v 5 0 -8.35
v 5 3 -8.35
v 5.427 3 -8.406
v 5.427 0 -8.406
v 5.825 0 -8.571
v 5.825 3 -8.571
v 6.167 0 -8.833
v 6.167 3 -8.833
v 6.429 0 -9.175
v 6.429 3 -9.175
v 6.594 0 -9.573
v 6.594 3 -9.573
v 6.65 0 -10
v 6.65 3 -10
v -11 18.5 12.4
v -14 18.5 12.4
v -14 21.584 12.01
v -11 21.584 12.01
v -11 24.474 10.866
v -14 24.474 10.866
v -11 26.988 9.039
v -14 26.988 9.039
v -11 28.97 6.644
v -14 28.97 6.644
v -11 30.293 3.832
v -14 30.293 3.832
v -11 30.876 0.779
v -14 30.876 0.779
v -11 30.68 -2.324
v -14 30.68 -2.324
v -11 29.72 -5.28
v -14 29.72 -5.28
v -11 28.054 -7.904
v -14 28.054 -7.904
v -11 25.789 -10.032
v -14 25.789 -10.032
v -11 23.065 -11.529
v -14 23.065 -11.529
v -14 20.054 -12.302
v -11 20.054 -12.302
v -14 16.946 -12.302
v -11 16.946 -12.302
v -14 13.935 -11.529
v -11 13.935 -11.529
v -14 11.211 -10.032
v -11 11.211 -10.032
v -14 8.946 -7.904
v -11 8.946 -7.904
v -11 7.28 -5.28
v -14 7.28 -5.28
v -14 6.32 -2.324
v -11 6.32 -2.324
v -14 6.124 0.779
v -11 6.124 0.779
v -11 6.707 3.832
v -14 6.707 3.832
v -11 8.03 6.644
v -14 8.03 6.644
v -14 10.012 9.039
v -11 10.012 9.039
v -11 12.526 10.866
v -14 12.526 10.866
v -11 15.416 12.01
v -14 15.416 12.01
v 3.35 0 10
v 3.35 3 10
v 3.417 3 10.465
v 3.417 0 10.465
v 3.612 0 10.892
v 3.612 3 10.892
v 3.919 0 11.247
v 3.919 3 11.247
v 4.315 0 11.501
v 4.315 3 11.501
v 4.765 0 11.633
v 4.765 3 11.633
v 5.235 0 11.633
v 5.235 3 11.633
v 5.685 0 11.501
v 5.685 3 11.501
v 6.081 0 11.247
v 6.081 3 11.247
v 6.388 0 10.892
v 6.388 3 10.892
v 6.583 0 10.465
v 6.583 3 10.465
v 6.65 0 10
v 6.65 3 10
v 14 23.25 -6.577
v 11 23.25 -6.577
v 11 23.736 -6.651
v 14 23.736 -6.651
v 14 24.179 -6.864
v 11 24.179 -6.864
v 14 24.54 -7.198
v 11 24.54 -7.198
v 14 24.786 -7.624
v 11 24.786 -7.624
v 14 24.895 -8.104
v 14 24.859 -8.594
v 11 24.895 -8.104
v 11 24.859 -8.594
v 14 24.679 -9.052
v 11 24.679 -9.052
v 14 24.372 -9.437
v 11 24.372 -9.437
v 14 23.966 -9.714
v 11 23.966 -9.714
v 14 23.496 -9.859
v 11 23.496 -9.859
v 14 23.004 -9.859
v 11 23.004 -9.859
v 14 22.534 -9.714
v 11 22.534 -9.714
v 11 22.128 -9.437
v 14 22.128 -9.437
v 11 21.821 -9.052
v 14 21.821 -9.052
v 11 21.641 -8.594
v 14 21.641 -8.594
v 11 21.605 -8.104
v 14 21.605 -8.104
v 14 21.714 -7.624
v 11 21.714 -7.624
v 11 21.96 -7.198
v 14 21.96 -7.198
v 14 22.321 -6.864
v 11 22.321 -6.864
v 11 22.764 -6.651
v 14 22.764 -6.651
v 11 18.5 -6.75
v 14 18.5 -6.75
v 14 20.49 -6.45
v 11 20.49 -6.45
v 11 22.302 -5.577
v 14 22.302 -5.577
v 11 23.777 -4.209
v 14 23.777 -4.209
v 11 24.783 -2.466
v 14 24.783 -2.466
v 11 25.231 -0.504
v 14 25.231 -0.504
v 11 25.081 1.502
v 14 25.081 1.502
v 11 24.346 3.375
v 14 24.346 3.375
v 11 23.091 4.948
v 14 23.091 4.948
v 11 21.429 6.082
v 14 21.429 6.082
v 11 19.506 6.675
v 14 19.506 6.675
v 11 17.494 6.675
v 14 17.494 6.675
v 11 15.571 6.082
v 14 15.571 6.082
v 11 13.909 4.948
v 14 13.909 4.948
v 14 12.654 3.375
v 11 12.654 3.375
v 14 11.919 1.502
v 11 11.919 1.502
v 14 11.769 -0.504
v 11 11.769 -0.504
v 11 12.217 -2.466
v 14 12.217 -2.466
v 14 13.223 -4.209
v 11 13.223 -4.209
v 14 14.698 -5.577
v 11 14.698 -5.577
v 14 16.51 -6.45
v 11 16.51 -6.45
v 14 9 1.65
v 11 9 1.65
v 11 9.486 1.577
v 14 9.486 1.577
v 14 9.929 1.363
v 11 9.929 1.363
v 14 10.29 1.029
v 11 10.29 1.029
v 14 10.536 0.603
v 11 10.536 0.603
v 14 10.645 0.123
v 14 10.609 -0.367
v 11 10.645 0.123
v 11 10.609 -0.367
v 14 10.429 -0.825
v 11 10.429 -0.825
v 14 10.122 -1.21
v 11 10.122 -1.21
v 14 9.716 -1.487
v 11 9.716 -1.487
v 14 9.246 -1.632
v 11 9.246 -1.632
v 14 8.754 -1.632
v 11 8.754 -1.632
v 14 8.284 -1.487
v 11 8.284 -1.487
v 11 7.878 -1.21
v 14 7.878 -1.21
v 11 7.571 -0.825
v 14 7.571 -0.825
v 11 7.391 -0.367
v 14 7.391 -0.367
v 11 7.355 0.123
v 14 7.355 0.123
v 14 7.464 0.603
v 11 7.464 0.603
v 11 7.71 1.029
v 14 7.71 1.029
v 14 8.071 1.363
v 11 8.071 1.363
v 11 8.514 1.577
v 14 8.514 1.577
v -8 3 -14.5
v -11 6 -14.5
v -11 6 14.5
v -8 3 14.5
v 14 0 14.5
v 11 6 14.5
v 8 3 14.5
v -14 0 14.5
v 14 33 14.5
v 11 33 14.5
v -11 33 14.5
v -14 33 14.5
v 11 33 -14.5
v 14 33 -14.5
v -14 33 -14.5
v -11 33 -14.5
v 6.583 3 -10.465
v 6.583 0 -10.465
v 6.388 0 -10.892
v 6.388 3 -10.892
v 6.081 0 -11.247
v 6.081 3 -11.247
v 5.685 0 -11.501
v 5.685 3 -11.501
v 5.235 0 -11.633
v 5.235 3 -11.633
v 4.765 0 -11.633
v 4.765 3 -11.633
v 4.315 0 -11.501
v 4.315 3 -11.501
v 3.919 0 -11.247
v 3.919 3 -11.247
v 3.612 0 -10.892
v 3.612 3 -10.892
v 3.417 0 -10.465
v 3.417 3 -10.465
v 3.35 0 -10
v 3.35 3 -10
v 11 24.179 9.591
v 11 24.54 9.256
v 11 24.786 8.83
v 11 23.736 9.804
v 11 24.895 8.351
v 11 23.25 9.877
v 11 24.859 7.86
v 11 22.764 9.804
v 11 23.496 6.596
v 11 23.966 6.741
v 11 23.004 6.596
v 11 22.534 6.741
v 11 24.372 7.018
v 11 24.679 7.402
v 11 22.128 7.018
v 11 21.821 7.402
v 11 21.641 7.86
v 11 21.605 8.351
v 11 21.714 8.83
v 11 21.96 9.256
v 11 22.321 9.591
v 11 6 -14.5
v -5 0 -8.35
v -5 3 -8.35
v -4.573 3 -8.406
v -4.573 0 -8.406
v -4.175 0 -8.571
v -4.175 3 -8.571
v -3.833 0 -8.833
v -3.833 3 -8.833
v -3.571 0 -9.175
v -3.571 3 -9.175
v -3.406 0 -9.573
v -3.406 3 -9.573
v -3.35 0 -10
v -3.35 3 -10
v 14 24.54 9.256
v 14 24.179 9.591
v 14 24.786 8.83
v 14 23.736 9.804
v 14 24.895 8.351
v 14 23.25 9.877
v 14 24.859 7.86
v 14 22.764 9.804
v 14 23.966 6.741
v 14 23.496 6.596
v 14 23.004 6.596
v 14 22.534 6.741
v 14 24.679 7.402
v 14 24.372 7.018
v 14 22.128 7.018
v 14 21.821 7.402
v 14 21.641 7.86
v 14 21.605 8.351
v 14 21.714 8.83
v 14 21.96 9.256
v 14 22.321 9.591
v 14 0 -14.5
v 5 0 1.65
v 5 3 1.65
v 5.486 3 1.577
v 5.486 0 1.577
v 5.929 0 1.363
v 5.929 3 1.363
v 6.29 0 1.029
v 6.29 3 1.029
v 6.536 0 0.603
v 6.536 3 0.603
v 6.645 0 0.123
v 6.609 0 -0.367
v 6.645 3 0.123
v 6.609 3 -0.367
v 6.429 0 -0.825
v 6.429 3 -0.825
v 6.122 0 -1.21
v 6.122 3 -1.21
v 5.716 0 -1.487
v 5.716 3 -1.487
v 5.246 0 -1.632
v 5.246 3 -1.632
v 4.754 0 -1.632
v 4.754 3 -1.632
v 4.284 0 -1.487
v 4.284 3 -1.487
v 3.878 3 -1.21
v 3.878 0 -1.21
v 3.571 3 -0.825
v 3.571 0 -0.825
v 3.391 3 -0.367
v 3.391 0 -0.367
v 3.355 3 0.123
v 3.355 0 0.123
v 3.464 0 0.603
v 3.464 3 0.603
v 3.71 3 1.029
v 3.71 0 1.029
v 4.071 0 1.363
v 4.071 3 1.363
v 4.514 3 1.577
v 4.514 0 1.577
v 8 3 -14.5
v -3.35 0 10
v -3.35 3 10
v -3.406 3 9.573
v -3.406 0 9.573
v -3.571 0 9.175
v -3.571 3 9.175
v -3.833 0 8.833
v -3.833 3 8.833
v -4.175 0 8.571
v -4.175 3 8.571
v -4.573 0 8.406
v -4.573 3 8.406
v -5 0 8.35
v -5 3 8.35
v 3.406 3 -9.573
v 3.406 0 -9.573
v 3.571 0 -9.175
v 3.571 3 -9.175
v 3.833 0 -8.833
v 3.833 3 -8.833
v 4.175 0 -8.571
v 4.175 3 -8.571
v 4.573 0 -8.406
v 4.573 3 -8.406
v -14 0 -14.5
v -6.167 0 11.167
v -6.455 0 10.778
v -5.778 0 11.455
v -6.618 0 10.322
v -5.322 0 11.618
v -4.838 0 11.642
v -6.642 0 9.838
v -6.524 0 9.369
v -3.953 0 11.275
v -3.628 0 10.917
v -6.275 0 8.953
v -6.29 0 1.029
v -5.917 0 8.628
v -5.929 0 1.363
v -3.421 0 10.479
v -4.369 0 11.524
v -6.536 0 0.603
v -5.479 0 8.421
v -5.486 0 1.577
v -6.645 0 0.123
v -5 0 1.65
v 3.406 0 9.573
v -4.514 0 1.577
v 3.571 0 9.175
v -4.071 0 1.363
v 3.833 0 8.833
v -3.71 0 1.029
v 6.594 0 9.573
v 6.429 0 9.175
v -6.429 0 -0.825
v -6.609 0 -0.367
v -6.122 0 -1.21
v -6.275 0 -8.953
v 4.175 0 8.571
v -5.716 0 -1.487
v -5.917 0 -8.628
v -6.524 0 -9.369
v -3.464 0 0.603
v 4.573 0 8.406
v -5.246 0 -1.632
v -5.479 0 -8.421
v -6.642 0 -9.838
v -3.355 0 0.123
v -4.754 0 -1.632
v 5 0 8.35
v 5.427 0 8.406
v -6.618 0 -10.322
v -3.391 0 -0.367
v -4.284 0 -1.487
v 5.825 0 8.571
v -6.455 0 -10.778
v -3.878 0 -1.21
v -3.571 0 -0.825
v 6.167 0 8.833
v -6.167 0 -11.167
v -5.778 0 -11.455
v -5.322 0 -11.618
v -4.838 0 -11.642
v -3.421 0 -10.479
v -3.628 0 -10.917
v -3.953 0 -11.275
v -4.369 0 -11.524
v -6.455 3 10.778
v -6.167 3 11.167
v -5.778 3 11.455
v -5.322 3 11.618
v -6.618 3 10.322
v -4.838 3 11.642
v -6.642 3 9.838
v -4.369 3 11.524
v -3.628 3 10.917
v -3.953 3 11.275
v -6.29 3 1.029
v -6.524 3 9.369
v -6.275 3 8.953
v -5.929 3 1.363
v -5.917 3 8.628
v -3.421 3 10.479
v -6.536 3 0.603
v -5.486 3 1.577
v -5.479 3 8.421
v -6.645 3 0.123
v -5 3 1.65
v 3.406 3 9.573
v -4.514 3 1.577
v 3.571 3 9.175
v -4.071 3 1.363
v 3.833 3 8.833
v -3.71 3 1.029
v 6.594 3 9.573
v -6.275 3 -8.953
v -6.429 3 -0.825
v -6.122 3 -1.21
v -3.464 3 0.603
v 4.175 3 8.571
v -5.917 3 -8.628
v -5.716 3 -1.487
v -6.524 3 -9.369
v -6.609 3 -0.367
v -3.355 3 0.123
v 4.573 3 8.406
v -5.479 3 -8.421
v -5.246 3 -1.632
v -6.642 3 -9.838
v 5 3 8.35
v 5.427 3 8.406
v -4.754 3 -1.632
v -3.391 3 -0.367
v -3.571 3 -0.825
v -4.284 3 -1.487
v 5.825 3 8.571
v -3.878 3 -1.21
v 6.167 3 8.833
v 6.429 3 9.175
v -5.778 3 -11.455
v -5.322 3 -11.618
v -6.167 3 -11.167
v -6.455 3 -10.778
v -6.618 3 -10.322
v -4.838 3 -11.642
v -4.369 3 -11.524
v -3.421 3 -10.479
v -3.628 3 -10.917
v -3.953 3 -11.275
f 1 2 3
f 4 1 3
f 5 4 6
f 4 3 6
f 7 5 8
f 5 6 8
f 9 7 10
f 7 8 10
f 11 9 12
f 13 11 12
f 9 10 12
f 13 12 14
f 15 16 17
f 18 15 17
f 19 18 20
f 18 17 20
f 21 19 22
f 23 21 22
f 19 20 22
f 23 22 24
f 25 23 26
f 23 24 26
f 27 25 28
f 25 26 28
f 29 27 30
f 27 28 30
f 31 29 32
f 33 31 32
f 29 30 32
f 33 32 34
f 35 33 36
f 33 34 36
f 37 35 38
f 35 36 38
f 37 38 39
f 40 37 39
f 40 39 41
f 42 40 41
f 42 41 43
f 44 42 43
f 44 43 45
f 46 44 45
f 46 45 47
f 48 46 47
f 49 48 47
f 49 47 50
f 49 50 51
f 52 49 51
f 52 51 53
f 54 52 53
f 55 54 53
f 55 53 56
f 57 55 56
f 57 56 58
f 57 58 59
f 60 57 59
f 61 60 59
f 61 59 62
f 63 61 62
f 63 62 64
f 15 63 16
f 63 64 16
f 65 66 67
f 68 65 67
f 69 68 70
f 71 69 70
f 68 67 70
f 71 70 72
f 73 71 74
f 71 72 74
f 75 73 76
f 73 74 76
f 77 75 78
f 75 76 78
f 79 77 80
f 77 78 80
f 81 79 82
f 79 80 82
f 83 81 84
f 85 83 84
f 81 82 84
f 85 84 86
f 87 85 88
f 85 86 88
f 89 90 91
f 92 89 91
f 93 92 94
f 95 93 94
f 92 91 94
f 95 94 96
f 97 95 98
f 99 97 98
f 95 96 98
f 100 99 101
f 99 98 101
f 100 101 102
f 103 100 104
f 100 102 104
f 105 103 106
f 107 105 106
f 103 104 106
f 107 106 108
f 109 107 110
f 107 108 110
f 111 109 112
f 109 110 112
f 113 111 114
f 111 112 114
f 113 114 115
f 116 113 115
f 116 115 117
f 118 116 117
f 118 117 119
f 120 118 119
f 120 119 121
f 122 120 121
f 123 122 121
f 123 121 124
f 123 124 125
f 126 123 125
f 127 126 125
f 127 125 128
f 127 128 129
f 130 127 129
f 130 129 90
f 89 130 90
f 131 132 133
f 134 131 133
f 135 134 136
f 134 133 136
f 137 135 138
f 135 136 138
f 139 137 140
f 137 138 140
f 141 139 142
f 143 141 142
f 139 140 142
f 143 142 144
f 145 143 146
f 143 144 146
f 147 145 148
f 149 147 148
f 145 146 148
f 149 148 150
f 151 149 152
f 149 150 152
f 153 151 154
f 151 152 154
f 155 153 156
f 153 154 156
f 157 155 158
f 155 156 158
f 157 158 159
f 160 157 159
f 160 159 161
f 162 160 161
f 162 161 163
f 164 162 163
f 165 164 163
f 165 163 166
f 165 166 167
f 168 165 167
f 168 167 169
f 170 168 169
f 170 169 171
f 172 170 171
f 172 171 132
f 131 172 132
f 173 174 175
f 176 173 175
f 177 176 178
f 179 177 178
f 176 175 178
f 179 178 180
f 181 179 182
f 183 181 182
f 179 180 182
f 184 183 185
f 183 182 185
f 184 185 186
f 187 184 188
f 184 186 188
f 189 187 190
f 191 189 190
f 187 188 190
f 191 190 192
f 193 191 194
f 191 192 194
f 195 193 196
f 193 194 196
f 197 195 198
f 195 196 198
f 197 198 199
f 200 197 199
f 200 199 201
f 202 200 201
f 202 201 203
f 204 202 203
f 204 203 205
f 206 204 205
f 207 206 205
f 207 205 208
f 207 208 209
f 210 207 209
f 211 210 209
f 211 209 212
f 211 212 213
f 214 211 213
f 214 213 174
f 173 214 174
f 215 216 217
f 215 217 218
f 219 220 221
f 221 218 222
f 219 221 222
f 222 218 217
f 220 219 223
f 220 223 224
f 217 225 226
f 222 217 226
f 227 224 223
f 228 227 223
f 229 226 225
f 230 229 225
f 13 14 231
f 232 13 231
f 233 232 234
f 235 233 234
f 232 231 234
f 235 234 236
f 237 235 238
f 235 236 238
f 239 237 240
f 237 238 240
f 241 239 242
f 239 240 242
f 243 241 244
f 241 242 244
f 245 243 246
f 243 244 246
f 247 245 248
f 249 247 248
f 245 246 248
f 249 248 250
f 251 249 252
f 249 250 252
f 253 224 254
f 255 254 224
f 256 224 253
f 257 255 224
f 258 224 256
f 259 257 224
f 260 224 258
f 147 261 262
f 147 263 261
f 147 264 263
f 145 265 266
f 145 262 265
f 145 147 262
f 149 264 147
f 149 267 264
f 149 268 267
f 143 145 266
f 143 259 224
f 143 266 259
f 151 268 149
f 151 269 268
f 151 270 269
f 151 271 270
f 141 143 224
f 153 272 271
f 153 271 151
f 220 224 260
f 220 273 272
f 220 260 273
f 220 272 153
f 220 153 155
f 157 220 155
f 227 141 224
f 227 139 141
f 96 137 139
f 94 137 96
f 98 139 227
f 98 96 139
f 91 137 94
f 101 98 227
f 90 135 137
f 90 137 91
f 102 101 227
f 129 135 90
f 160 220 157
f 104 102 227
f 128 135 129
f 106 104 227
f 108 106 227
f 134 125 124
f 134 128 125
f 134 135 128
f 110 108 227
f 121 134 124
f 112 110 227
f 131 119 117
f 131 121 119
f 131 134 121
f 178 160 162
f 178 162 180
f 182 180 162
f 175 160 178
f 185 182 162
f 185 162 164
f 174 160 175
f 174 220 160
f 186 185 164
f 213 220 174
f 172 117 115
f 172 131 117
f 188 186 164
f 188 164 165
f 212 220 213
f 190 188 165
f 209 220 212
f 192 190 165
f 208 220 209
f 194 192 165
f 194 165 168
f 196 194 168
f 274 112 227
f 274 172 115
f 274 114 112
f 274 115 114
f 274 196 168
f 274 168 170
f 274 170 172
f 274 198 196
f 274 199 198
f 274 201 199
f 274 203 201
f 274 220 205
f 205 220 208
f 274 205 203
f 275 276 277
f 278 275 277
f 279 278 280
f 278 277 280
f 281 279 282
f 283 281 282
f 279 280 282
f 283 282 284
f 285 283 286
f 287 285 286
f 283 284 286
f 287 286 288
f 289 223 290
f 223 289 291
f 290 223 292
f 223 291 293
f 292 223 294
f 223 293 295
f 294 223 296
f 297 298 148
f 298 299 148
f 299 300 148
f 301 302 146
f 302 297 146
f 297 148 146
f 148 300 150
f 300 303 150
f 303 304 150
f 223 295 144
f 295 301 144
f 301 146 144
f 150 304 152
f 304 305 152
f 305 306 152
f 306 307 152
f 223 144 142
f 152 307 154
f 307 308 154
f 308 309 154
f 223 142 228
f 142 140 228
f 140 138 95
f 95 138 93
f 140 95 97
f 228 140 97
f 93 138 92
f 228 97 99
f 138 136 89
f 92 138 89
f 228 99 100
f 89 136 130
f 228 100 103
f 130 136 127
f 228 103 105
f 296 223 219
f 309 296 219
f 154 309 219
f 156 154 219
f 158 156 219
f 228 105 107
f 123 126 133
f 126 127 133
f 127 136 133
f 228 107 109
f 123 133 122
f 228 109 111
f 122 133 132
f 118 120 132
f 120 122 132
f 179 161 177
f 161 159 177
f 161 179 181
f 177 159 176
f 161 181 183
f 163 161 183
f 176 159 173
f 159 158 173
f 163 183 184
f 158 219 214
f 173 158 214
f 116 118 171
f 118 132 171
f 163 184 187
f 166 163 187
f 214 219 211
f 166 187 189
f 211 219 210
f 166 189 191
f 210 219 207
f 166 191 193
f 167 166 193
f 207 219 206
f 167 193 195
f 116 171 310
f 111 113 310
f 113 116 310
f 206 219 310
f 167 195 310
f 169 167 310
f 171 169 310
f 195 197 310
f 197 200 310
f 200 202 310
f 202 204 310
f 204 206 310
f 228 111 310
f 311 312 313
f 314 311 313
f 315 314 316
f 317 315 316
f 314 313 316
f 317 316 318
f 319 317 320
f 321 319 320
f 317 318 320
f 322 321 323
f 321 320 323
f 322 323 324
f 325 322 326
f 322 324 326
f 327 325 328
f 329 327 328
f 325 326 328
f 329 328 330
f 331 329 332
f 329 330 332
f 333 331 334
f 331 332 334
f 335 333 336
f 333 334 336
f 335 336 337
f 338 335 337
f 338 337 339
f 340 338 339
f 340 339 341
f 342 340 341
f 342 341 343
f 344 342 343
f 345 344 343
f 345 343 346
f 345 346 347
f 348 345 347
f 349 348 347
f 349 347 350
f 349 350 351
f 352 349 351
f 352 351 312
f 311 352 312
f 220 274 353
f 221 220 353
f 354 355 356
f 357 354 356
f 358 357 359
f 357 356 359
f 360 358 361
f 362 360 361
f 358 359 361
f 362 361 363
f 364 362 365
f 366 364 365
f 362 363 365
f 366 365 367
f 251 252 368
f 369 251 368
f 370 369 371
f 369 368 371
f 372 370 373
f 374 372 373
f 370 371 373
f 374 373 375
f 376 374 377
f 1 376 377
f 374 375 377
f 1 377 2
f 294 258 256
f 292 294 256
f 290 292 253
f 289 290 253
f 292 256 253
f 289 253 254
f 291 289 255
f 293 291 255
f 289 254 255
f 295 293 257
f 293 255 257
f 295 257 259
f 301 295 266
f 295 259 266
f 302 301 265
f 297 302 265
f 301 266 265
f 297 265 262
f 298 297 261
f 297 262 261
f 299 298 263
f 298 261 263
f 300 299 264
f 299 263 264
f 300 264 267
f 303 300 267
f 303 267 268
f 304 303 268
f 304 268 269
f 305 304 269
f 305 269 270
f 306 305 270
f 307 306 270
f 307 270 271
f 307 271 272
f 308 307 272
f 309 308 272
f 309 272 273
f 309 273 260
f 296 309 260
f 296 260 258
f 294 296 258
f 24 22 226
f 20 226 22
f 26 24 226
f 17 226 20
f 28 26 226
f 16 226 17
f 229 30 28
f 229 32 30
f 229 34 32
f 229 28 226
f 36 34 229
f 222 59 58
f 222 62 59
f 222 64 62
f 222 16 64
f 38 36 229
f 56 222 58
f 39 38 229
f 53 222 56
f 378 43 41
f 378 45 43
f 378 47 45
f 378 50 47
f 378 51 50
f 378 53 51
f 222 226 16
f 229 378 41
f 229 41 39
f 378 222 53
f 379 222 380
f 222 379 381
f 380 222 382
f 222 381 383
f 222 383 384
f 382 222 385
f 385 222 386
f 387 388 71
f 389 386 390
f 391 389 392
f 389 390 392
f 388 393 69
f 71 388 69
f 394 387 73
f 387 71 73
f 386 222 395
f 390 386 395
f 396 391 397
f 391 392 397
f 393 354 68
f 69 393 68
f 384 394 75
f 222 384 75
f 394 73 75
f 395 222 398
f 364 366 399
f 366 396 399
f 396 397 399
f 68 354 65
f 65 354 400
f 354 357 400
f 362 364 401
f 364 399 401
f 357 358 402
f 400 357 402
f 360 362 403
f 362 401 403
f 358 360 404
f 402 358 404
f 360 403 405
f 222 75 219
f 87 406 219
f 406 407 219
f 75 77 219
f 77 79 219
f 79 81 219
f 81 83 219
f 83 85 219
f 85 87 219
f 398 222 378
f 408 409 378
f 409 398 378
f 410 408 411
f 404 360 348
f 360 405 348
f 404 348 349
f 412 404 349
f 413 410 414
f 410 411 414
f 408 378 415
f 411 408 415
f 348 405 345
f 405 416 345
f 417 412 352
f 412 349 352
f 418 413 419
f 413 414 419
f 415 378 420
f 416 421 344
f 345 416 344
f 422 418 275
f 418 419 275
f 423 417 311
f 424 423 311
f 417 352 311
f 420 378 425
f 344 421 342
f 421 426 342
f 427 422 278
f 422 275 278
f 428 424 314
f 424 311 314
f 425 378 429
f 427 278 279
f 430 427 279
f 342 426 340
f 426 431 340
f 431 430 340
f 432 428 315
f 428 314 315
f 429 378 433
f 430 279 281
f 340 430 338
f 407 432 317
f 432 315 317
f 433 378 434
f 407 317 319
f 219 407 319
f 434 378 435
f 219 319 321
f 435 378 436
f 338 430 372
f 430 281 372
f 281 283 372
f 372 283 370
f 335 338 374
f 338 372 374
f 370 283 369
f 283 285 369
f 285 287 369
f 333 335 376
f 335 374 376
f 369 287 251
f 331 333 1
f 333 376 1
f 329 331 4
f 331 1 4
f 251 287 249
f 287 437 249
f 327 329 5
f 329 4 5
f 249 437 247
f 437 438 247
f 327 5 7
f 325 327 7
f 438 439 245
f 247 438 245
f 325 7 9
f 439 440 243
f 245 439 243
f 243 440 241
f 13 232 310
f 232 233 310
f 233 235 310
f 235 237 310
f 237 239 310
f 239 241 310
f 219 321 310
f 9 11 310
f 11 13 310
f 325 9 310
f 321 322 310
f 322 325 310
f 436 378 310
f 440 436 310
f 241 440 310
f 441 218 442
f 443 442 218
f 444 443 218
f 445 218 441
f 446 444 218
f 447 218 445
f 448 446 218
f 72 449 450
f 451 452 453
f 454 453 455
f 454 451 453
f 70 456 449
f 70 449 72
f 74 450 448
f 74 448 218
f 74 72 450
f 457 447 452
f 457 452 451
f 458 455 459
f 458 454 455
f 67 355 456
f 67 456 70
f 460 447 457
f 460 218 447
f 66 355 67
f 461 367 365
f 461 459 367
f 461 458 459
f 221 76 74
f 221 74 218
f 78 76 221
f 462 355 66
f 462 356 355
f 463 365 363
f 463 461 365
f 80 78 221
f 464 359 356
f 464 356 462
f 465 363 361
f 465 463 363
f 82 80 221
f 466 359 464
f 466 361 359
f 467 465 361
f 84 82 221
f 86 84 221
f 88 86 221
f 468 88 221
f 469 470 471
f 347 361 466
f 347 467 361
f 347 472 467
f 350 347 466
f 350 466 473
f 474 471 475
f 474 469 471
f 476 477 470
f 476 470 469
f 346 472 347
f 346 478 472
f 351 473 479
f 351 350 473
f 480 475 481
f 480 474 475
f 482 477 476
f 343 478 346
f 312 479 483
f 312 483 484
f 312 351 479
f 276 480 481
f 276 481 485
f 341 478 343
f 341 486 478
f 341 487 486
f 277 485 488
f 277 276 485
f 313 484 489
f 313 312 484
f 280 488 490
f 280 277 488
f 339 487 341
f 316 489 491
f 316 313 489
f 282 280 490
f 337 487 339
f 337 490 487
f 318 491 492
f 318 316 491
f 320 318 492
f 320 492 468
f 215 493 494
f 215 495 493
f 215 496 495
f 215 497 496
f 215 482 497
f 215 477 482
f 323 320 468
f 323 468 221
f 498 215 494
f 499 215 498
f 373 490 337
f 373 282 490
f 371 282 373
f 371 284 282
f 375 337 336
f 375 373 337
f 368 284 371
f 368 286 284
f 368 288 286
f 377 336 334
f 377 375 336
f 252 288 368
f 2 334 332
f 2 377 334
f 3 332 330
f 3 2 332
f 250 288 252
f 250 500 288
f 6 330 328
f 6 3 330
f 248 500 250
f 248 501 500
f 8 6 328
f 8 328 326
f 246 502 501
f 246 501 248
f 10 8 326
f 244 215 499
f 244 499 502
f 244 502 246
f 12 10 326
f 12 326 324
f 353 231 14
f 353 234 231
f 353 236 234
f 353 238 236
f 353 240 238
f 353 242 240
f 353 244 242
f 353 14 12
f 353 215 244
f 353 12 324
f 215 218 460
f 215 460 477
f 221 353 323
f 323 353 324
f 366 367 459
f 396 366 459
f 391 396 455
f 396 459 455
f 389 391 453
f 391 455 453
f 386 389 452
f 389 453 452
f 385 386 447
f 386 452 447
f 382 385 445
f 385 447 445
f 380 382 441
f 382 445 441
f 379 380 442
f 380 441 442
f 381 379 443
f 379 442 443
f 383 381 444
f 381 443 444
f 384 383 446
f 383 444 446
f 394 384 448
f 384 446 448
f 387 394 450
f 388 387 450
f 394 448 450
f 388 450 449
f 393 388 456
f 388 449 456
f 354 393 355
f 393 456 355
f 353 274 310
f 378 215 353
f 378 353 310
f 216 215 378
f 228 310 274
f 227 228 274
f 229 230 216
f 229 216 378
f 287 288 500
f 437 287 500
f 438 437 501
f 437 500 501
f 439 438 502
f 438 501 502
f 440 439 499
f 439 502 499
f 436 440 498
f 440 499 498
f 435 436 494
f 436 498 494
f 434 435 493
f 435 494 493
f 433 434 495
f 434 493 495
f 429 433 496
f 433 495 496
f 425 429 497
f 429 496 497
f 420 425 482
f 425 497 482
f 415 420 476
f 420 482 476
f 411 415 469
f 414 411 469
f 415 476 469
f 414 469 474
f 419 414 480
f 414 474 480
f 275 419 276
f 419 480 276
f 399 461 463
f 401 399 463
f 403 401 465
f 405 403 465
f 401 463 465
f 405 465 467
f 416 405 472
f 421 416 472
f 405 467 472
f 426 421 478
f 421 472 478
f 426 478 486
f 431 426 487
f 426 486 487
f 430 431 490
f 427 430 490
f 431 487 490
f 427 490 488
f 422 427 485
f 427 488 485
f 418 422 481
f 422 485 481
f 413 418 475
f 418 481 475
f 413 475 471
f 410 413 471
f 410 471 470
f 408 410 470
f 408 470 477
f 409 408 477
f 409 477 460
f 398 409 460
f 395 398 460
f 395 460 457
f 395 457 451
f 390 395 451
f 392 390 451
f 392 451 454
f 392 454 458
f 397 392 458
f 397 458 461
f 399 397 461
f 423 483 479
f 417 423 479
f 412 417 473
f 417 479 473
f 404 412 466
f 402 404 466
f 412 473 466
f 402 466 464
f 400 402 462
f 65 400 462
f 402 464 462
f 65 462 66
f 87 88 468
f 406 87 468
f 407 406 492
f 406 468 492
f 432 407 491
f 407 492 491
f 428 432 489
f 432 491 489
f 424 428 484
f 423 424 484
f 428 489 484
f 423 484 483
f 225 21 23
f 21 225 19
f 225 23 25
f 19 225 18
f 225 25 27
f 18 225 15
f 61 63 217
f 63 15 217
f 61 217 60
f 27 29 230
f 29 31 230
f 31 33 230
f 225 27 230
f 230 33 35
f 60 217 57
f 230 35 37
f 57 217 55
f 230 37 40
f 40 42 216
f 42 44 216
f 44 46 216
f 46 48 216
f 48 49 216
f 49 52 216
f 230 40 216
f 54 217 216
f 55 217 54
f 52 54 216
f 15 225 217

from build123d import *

# Parameters (mm, degrees)
SKETCH_1_W          = 28
SKETCH_1_H          = 29
EXTRUDE_1_DEPTH     = 3
SKETCH_2_W          = 3
SKETCH_2_H          = 29
EXTRUDE_2_DEPTH     = 30
SKETCH_3_R          = 1.65
CUT_EXTRUDE_1_DEPTH = 33
EXTRUDE_3_DEPTH     = 29
SKETCH_6_R          = 12.4
CUT_EXTRUDE_2_DEPTH = 5
SKETCH_8_R          = 1.65
CUT_EXTRUDE_3_DEPTH = 5
SKETCH_9_R          = 6.75
CUT_EXTRUDE_4_DEPTH = 5


with BuildPart() as part:
    # 草图1 → 凸台-拉伸1 (new body)
    with BuildSketch(Plane(origin=(0, 0, 0), x_dir=(1, 0, 0), z_dir=(0, 1, 0))):
        Rectangle(SKETCH_1_W, SKETCH_1_H)
    extrude(amount=EXTRUDE_1_DEPTH)

    # 草图2 → 凸台-拉伸2 (add)
    with BuildSketch(Plane(origin=(0, 3, 0), x_dir=(1, 0, 0), z_dir=(0, 1, 0))):
        with Locations((12.5, 0)):
            Rectangle(SKETCH_2_W, SKETCH_2_H)
        with Locations((-12.5, 0)):
            Rectangle(SKETCH_2_W, SKETCH_2_H)
    extrude(amount=EXTRUDE_2_DEPTH)

    # 草图3 → 切除-拉伸1 (cut)
    with BuildSketch(Plane.ZY.offset(14)):
        with Locations((-8.227241336, 23.25)):
            Circle(SKETCH_3_R)
        with Locations((8.227241336, 23.25)):
            Circle(SKETCH_3_R)
        with Locations((0, 9)):
            Circle(SKETCH_3_R)
    extrude(amount=-CUT_EXTRUDE_1_DEPTH, mode=Mode.SUBTRACT)

    # 草图5 → 凸台-拉伸3 (add)
    with BuildSketch(Plane(origin=(0, 0, -14.5), x_dir=(-1, 0, 0), z_dir=(0, 0, -1))):
        Polygon((11, 3), (11, 6), (8, 3), align=None)
        Polygon((-11, 3), (-11, 6), (-8, 3), align=None)
    extrude(amount=-EXTRUDE_3_DEPTH)

    # 草图6 → 切除-拉伸2 (cut)
    with BuildSketch(Plane.ZY.offset(14)):
        with Locations((0, 18.5)):
            Circle(SKETCH_6_R)
    extrude(amount=-CUT_EXTRUDE_2_DEPTH, mode=Mode.SUBTRACT)

    # 草图8 → 切除-拉伸3 (cut)
    with BuildSketch(Plane(origin=(0, 3, 0), x_dir=(1, 0, 0), z_dir=(0, 1, 0))):
        with BuildLine():
            ThreePointArc((-3.35, 10), (-6.166726189, 11.166726189), (-5, 8.35))
            Line((-5, 8.35), (-5, 10))
            Line((-5, 10), (-3.35, 10))
        make_face()
        with BuildLine():
            Line((-5, 10), (-5, 8.35))
            ThreePointArc((-5, 8.35), (-3.833273811, 8.833273811), (-3.35, 10))
            Line((-3.35, 10), (-5, 10))
        make_face()
        with BuildLine():
            ThreePointArc((3.35, 10), (3.833273811, 8.833273811), (5, 8.35))
            Line((5, 8.35), (5, 10))
            Line((5, 10), (3.35, 10))
        make_face()
        with BuildLine():
            Line((5, 10), (5, 8.35))
            ThreePointArc((5, 8.35), (6.166726189, 8.833273811), (6.65, 10))
            ThreePointArc((6.65, 10), (5, 11.65), (3.35, 10))
            Line((3.35, 10), (5, 10))
        make_face()
        with BuildLine():
            ThreePointArc((5, -8.35), (3.833273811, -8.833273811), (3.35, -10))
            Line((3.35, -10), (5, -10))
            Line((5, -10), (5, -8.35))
        make_face()
        with BuildLine():
            Line((5, -10), (3.35, -10))
            ThreePointArc((3.35, -10), (5, -11.65), (6.65, -10))
            ThreePointArc((6.65, -10), (6.166726189, -8.833273811), (5, -8.35))
            Line((5, -8.35), (5, -10))
        make_face()
        with BuildLine():
            Line((-5, -8.35), (-5, -10))
            Line((-5, -10), (-3.35, -10))
            ThreePointArc((-3.35, -10), (-3.833273811, -8.833273811), (-5, -8.35))
        make_face()
        with BuildLine():
            Line((-3.35, -10), (-5, -10))
            Line((-5, -10), (-5, -8.35))
            ThreePointArc((-5, -8.35), (-6.166726189, -11.166726189), (-3.35, -10))
        make_face()
        with Locations(Location((5, 0, 0), (0, 0, 270))):
            Circle(SKETCH_8_R)
        with Locations(Location((-5, 0, 0), (0, 0, 270))):
            Circle(SKETCH_8_R)
    extrude(amount=-CUT_EXTRUDE_3_DEPTH, mode=Mode.SUBTRACT)

    # 草图9 → 切除-拉伸4 (cut)
    with BuildSketch(Plane(origin=(14, 0, 0), x_dir=(0, 0, -1), z_dir=(1, 0, 0))):
        with Locations((0, 18.5)):
            Circle(SKETCH_9_R)
    extrude(amount=-CUT_EXTRUDE_4_DEPTH, mode=Mode.SUBTRACT)


solid = part.part
